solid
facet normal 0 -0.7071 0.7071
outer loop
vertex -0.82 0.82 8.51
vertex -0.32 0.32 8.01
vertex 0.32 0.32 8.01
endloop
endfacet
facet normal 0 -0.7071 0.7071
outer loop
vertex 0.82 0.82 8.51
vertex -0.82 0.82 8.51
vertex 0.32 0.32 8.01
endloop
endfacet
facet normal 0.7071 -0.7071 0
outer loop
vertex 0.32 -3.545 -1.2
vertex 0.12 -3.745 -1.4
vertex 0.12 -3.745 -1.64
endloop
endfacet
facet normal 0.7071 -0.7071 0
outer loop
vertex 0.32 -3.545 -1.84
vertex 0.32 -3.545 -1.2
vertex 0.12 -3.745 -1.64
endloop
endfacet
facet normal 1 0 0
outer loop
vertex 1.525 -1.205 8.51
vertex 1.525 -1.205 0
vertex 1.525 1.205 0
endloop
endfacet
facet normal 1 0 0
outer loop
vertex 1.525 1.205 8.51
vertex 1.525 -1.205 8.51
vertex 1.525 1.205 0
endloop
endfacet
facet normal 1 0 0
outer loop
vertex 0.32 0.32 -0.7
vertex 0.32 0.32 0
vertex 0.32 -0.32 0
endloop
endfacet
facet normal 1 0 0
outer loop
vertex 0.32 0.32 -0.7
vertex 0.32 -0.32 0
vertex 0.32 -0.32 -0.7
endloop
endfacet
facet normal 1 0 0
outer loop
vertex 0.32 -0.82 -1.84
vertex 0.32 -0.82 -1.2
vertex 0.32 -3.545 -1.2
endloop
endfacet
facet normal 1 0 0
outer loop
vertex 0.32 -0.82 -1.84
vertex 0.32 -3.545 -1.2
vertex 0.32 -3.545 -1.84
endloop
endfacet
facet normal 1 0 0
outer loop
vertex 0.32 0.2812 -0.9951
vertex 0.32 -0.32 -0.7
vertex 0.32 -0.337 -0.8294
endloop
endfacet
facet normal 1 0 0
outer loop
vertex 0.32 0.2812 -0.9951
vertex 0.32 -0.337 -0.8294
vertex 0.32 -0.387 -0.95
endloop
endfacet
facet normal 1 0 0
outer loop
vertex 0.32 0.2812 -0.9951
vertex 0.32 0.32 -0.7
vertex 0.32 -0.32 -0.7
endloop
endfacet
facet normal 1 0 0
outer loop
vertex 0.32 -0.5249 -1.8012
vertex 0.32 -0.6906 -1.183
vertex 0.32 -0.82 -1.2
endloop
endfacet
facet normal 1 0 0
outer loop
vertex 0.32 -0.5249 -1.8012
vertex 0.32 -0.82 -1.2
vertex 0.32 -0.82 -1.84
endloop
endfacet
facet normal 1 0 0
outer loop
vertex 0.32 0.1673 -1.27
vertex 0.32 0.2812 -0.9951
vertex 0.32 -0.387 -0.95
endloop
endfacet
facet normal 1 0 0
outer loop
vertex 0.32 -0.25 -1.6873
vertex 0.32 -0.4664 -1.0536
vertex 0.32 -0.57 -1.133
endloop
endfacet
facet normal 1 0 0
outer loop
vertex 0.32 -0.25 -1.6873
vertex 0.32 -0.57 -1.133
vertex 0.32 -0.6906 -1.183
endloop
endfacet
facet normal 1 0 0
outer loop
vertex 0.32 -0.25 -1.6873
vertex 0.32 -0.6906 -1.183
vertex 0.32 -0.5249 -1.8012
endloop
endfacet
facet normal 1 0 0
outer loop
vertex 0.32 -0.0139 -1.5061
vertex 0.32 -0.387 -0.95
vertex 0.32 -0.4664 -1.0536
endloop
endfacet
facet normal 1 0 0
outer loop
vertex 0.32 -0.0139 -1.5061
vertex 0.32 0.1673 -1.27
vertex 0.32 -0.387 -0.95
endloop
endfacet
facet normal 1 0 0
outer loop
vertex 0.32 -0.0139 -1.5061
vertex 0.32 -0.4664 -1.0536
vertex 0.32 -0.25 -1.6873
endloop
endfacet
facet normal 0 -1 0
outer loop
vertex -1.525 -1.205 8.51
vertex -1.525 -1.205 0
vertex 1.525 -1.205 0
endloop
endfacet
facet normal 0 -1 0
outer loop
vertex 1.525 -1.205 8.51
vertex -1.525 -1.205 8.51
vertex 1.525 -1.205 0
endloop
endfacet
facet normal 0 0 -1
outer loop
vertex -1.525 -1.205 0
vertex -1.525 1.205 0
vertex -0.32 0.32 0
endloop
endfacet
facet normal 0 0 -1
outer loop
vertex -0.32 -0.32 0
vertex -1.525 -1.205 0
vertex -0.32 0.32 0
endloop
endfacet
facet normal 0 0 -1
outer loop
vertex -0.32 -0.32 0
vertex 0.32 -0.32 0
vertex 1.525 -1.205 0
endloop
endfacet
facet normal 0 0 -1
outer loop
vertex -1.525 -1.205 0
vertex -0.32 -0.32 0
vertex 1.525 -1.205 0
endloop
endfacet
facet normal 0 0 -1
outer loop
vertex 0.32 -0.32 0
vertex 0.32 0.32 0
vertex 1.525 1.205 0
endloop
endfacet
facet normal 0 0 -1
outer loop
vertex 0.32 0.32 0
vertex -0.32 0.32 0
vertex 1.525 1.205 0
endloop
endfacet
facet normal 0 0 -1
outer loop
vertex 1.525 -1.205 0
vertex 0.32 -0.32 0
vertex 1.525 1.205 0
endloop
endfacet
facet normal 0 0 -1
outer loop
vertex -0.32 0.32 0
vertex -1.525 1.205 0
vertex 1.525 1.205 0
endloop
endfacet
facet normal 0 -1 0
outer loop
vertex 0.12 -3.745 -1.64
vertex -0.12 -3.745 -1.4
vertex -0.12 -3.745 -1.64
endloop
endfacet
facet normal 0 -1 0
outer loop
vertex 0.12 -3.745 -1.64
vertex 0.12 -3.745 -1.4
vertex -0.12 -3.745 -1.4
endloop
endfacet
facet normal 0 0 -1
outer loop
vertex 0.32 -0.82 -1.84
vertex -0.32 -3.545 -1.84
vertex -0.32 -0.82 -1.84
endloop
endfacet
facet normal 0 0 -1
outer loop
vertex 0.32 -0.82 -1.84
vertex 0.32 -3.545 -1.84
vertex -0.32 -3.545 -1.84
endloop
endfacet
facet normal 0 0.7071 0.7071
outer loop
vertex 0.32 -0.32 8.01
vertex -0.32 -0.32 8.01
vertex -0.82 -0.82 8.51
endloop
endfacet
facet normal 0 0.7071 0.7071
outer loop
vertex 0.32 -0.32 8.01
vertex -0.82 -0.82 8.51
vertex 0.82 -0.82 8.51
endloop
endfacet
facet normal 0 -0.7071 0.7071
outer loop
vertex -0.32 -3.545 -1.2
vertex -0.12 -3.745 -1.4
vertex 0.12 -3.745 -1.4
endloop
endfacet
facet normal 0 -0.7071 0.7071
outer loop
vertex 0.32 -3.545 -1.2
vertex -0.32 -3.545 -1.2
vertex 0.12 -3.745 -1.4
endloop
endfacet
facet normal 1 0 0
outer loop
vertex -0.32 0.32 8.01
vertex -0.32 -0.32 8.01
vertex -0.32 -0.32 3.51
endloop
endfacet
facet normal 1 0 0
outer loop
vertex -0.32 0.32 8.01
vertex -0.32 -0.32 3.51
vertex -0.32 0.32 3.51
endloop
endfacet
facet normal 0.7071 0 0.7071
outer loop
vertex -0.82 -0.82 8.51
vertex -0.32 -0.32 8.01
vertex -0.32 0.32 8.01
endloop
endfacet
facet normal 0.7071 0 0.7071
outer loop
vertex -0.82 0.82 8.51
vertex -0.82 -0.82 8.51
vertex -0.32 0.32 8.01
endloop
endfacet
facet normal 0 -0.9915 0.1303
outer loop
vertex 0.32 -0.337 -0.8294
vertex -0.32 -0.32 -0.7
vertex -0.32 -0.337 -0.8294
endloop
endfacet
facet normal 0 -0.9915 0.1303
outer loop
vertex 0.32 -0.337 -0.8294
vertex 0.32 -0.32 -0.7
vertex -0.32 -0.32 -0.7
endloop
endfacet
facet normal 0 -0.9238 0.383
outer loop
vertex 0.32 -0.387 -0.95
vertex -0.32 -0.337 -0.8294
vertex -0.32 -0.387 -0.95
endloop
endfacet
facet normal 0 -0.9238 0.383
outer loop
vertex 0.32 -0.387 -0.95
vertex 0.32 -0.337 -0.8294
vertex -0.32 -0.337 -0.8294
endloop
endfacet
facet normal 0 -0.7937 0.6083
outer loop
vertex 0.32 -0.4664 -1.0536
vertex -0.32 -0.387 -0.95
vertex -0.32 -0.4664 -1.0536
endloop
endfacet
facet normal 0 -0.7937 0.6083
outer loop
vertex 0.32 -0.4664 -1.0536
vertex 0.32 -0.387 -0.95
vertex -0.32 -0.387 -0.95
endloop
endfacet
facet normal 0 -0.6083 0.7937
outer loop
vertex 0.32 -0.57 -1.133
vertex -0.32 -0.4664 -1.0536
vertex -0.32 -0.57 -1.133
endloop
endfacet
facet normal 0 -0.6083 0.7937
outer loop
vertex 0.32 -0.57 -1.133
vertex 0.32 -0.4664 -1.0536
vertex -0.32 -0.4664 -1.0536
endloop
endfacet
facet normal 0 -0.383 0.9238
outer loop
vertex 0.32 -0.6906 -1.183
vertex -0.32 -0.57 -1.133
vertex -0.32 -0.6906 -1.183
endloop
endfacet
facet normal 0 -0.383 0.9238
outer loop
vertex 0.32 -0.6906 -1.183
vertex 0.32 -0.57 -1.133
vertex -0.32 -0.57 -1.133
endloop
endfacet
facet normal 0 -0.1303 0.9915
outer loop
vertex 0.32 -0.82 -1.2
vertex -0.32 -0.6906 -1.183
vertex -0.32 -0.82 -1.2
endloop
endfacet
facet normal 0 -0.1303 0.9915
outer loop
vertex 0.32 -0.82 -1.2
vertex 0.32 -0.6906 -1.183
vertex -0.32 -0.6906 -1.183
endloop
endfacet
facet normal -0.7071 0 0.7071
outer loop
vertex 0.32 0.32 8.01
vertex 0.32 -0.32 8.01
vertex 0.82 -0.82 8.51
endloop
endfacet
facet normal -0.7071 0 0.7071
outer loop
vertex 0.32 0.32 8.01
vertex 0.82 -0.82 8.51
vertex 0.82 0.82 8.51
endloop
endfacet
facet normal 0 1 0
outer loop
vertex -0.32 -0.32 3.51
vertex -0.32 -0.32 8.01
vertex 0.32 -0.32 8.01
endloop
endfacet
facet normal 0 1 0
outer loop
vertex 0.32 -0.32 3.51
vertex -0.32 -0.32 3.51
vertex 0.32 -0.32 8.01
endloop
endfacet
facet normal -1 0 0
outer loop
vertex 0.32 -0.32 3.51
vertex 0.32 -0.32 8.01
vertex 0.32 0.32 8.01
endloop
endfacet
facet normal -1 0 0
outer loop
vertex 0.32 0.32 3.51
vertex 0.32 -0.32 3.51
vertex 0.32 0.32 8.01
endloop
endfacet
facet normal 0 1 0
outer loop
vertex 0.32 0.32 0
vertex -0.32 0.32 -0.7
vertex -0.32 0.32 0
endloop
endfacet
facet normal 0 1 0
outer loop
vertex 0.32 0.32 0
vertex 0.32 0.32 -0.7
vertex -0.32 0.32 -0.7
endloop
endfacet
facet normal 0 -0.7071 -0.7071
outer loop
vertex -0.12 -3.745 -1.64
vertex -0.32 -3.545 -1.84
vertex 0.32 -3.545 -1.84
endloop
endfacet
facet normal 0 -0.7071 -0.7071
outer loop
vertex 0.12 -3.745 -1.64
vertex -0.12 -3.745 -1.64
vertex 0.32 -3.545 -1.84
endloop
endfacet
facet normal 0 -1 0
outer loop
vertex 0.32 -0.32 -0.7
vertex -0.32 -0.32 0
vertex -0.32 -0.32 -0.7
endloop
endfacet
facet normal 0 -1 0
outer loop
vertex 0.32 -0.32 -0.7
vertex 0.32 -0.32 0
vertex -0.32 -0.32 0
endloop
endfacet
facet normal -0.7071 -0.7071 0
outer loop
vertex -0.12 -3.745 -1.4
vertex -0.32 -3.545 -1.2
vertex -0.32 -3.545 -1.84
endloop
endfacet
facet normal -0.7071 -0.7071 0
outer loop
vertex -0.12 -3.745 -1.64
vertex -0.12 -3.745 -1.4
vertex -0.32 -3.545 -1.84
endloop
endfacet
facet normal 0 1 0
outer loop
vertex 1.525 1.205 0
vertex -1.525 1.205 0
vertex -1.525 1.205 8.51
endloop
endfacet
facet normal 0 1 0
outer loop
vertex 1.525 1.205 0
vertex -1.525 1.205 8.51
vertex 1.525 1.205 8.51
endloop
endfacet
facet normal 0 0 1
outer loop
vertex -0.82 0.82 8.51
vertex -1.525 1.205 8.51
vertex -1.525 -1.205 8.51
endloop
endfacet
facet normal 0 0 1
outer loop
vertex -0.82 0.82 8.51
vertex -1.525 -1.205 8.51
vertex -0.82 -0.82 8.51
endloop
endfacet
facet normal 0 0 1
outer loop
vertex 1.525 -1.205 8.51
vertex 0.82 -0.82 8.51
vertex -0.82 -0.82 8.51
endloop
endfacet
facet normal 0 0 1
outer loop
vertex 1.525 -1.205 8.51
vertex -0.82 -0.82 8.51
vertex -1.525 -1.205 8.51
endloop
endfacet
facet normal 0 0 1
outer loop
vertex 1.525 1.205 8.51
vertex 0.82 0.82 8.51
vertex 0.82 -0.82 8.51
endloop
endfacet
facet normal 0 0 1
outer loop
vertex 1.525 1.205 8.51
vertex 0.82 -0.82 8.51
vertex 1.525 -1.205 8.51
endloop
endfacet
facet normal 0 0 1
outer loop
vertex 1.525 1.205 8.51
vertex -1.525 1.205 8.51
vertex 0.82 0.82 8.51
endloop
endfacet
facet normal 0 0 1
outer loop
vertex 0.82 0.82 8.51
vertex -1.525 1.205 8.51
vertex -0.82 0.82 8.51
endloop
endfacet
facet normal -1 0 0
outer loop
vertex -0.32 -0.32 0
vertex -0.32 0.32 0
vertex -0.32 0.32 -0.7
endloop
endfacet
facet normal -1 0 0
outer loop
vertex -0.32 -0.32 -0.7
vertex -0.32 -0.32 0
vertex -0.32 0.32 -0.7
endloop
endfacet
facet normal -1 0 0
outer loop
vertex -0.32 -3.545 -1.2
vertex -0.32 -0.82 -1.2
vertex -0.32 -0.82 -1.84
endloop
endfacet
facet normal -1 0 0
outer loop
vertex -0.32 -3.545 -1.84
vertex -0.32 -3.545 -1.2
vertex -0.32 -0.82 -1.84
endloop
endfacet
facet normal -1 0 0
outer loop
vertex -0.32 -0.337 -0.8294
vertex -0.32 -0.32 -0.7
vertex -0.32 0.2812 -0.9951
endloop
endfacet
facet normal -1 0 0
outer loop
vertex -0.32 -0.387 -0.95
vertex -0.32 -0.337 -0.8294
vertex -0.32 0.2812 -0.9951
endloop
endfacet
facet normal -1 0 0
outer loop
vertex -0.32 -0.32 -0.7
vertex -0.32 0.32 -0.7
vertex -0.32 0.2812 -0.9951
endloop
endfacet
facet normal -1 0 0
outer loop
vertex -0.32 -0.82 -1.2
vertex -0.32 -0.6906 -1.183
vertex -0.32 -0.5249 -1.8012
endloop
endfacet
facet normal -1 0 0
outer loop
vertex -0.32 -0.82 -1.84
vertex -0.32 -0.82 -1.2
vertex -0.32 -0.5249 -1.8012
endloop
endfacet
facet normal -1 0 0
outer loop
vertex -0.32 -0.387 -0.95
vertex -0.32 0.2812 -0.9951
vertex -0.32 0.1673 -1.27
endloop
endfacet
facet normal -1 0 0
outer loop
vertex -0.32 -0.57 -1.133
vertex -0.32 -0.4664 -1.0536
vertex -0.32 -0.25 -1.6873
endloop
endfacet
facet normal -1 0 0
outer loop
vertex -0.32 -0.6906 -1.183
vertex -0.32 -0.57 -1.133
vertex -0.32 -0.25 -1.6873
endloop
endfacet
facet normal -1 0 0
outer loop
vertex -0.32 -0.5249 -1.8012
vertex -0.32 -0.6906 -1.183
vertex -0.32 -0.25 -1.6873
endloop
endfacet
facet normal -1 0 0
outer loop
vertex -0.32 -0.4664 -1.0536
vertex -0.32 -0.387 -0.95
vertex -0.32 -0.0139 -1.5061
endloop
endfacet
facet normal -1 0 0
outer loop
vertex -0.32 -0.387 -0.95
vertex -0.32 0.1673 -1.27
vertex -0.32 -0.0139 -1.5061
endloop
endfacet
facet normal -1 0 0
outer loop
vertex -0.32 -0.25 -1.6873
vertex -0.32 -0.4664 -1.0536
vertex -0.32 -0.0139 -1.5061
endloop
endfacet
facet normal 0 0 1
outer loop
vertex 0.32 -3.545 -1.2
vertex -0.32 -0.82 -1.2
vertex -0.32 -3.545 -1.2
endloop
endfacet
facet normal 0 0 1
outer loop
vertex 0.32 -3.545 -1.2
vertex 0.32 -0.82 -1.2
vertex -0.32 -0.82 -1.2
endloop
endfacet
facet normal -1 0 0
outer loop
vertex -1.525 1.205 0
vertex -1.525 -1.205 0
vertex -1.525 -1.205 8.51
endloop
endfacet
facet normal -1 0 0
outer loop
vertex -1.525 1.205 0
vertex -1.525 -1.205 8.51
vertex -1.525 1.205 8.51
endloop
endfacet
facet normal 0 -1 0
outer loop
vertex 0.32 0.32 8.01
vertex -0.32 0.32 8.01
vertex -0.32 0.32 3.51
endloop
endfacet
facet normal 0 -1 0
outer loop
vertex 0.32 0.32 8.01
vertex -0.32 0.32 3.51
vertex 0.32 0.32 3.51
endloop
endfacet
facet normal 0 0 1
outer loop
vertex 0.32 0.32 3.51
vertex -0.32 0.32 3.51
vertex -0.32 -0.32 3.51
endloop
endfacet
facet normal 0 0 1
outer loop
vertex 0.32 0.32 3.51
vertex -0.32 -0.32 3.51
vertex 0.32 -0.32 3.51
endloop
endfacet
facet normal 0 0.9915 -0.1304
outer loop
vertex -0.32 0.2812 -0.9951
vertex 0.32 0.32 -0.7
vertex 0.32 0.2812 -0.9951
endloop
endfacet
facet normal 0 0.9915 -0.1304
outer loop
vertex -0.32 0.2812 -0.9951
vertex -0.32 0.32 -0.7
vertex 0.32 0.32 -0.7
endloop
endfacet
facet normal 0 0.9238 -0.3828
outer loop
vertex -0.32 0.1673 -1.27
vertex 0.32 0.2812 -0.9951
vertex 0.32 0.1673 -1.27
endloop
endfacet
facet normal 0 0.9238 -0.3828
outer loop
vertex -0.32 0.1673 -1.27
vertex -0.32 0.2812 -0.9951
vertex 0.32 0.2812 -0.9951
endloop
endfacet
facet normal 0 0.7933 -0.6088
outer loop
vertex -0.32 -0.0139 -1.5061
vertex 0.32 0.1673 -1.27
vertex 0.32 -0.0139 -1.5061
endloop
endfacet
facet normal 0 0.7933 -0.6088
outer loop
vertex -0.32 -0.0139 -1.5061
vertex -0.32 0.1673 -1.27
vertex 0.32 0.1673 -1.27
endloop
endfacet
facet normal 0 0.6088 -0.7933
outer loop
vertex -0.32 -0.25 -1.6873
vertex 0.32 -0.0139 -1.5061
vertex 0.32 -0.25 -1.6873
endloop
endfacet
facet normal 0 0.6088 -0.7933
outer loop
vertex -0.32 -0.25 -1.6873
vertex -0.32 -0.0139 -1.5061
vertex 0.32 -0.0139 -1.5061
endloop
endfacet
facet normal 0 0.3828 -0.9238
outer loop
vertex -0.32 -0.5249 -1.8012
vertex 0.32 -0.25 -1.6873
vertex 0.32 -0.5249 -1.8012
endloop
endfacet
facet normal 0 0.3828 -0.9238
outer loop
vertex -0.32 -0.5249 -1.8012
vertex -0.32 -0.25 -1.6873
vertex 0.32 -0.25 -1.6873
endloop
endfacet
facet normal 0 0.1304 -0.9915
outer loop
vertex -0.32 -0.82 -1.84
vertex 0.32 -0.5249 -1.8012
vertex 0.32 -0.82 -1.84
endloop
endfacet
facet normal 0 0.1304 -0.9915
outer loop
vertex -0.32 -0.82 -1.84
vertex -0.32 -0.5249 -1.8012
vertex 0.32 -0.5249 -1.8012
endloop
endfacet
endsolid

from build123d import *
from OCP.BRepFilletAPI import BRepFilletAPI_MakeFillet

# Parameters (mm, degrees)
SKETCH1_W           = 3.05
SKETCH1_H           = 2.41
BOSS_EXTRUDE1_DEPTH = 8.51
CUT_EXTRUDE1_START  = 8.51
SKETCH1_3_W         = 0.64
SKETCH1_3_H         = 0.64
CUT_EXTRUDE1_DEPTH  = 5
CHAMFER1_SIZE       = 0.5
BOSS_EXTRUDE2_DEPTH = 0.32
FILLET1_R1          = 0.5
FILLET1_R2          = 1.14
CHAMFER2_SIZE       = 0.2


with BuildPart() as part:
    # Sketch1 → Boss-Extrude1 (new body)
    with BuildSketch(Plane.XY):
        Rectangle(SKETCH1_W, SKETCH1_H)
    extrude(amount=BOSS_EXTRUDE1_DEPTH)

    # Sketch1<3> → Cut-Extrude1 (cut)
    with BuildSketch(Plane.XY.offset(CUT_EXTRUDE1_START)):
        Rectangle(SKETCH1_3_W, SKETCH1_3_H)
    extrude(amount=-CUT_EXTRUDE1_DEPTH, mode=Mode.SUBTRACT)

    # Chamfer1
    chamfer1_edges = [part.edges().sort_by_distance(p)[0] for p in [
        (-0.32, 0, 8.51),
        (0, -0.32, 8.51),
        (0.32, 0, 8.51),
        (0, 0.32, 8.51),
    ]]
    chamfer(chamfer1_edges, length=CHAMFER1_SIZE)

    # Sketch2 → Boss-Extrude2 (add, symmetric)
    with BuildSketch(Plane(origin=(0, 0, 0), x_dir=(0, 0, -1), z_dir=(1, 0, 0))):
        Polygon((0, -0.32), (1.2, -0.32), (1.2, -3.745), (1.84, -3.745), (1.84, 0.32), (0, 0.32), align=None)
    extrude(amount=BOSS_EXTRUDE2_DEPTH, both=True)

    # Fillet1: one fillet with a radius per group of edges: ONE call of the kernel's fillet builder (fillet() takes one radius for all edges)
    fillet1_edges_1 = [part.edges().sort_by_distance(p)[0] for p in [
        (0, -0.32, -1.2),
    ]]
    fillet1_edges_2 = [part.edges().sort_by_distance(p)[0] for p in [
        (0, 0.32, -1.84),
    ]]
    fillet1 = BRepFilletAPI_MakeFillet(part.part.solid().wrapped)
    for e in fillet1_edges_1:
        fillet1.Add(FILLET1_R1, e.wrapped)
    for e in fillet1_edges_2:
        fillet1.Add(FILLET1_R2, e.wrapped)
    add(Compound.cast(fillet1.Shape()), mode=Mode.REPLACE)

    # Chamfer2
    chamfer2_edges = [part.edges().sort_by_distance(p)[0] for p in [
        (-0.32, -3.745, -1.52),
        (0, -3.745, -1.2),
        (0, -3.745, -1.84),
        (0.32, -3.745, -1.52),
    ]]
    chamfer(chamfer2_edges, length=CHAMFER2_SIZE)


solid = part.part
